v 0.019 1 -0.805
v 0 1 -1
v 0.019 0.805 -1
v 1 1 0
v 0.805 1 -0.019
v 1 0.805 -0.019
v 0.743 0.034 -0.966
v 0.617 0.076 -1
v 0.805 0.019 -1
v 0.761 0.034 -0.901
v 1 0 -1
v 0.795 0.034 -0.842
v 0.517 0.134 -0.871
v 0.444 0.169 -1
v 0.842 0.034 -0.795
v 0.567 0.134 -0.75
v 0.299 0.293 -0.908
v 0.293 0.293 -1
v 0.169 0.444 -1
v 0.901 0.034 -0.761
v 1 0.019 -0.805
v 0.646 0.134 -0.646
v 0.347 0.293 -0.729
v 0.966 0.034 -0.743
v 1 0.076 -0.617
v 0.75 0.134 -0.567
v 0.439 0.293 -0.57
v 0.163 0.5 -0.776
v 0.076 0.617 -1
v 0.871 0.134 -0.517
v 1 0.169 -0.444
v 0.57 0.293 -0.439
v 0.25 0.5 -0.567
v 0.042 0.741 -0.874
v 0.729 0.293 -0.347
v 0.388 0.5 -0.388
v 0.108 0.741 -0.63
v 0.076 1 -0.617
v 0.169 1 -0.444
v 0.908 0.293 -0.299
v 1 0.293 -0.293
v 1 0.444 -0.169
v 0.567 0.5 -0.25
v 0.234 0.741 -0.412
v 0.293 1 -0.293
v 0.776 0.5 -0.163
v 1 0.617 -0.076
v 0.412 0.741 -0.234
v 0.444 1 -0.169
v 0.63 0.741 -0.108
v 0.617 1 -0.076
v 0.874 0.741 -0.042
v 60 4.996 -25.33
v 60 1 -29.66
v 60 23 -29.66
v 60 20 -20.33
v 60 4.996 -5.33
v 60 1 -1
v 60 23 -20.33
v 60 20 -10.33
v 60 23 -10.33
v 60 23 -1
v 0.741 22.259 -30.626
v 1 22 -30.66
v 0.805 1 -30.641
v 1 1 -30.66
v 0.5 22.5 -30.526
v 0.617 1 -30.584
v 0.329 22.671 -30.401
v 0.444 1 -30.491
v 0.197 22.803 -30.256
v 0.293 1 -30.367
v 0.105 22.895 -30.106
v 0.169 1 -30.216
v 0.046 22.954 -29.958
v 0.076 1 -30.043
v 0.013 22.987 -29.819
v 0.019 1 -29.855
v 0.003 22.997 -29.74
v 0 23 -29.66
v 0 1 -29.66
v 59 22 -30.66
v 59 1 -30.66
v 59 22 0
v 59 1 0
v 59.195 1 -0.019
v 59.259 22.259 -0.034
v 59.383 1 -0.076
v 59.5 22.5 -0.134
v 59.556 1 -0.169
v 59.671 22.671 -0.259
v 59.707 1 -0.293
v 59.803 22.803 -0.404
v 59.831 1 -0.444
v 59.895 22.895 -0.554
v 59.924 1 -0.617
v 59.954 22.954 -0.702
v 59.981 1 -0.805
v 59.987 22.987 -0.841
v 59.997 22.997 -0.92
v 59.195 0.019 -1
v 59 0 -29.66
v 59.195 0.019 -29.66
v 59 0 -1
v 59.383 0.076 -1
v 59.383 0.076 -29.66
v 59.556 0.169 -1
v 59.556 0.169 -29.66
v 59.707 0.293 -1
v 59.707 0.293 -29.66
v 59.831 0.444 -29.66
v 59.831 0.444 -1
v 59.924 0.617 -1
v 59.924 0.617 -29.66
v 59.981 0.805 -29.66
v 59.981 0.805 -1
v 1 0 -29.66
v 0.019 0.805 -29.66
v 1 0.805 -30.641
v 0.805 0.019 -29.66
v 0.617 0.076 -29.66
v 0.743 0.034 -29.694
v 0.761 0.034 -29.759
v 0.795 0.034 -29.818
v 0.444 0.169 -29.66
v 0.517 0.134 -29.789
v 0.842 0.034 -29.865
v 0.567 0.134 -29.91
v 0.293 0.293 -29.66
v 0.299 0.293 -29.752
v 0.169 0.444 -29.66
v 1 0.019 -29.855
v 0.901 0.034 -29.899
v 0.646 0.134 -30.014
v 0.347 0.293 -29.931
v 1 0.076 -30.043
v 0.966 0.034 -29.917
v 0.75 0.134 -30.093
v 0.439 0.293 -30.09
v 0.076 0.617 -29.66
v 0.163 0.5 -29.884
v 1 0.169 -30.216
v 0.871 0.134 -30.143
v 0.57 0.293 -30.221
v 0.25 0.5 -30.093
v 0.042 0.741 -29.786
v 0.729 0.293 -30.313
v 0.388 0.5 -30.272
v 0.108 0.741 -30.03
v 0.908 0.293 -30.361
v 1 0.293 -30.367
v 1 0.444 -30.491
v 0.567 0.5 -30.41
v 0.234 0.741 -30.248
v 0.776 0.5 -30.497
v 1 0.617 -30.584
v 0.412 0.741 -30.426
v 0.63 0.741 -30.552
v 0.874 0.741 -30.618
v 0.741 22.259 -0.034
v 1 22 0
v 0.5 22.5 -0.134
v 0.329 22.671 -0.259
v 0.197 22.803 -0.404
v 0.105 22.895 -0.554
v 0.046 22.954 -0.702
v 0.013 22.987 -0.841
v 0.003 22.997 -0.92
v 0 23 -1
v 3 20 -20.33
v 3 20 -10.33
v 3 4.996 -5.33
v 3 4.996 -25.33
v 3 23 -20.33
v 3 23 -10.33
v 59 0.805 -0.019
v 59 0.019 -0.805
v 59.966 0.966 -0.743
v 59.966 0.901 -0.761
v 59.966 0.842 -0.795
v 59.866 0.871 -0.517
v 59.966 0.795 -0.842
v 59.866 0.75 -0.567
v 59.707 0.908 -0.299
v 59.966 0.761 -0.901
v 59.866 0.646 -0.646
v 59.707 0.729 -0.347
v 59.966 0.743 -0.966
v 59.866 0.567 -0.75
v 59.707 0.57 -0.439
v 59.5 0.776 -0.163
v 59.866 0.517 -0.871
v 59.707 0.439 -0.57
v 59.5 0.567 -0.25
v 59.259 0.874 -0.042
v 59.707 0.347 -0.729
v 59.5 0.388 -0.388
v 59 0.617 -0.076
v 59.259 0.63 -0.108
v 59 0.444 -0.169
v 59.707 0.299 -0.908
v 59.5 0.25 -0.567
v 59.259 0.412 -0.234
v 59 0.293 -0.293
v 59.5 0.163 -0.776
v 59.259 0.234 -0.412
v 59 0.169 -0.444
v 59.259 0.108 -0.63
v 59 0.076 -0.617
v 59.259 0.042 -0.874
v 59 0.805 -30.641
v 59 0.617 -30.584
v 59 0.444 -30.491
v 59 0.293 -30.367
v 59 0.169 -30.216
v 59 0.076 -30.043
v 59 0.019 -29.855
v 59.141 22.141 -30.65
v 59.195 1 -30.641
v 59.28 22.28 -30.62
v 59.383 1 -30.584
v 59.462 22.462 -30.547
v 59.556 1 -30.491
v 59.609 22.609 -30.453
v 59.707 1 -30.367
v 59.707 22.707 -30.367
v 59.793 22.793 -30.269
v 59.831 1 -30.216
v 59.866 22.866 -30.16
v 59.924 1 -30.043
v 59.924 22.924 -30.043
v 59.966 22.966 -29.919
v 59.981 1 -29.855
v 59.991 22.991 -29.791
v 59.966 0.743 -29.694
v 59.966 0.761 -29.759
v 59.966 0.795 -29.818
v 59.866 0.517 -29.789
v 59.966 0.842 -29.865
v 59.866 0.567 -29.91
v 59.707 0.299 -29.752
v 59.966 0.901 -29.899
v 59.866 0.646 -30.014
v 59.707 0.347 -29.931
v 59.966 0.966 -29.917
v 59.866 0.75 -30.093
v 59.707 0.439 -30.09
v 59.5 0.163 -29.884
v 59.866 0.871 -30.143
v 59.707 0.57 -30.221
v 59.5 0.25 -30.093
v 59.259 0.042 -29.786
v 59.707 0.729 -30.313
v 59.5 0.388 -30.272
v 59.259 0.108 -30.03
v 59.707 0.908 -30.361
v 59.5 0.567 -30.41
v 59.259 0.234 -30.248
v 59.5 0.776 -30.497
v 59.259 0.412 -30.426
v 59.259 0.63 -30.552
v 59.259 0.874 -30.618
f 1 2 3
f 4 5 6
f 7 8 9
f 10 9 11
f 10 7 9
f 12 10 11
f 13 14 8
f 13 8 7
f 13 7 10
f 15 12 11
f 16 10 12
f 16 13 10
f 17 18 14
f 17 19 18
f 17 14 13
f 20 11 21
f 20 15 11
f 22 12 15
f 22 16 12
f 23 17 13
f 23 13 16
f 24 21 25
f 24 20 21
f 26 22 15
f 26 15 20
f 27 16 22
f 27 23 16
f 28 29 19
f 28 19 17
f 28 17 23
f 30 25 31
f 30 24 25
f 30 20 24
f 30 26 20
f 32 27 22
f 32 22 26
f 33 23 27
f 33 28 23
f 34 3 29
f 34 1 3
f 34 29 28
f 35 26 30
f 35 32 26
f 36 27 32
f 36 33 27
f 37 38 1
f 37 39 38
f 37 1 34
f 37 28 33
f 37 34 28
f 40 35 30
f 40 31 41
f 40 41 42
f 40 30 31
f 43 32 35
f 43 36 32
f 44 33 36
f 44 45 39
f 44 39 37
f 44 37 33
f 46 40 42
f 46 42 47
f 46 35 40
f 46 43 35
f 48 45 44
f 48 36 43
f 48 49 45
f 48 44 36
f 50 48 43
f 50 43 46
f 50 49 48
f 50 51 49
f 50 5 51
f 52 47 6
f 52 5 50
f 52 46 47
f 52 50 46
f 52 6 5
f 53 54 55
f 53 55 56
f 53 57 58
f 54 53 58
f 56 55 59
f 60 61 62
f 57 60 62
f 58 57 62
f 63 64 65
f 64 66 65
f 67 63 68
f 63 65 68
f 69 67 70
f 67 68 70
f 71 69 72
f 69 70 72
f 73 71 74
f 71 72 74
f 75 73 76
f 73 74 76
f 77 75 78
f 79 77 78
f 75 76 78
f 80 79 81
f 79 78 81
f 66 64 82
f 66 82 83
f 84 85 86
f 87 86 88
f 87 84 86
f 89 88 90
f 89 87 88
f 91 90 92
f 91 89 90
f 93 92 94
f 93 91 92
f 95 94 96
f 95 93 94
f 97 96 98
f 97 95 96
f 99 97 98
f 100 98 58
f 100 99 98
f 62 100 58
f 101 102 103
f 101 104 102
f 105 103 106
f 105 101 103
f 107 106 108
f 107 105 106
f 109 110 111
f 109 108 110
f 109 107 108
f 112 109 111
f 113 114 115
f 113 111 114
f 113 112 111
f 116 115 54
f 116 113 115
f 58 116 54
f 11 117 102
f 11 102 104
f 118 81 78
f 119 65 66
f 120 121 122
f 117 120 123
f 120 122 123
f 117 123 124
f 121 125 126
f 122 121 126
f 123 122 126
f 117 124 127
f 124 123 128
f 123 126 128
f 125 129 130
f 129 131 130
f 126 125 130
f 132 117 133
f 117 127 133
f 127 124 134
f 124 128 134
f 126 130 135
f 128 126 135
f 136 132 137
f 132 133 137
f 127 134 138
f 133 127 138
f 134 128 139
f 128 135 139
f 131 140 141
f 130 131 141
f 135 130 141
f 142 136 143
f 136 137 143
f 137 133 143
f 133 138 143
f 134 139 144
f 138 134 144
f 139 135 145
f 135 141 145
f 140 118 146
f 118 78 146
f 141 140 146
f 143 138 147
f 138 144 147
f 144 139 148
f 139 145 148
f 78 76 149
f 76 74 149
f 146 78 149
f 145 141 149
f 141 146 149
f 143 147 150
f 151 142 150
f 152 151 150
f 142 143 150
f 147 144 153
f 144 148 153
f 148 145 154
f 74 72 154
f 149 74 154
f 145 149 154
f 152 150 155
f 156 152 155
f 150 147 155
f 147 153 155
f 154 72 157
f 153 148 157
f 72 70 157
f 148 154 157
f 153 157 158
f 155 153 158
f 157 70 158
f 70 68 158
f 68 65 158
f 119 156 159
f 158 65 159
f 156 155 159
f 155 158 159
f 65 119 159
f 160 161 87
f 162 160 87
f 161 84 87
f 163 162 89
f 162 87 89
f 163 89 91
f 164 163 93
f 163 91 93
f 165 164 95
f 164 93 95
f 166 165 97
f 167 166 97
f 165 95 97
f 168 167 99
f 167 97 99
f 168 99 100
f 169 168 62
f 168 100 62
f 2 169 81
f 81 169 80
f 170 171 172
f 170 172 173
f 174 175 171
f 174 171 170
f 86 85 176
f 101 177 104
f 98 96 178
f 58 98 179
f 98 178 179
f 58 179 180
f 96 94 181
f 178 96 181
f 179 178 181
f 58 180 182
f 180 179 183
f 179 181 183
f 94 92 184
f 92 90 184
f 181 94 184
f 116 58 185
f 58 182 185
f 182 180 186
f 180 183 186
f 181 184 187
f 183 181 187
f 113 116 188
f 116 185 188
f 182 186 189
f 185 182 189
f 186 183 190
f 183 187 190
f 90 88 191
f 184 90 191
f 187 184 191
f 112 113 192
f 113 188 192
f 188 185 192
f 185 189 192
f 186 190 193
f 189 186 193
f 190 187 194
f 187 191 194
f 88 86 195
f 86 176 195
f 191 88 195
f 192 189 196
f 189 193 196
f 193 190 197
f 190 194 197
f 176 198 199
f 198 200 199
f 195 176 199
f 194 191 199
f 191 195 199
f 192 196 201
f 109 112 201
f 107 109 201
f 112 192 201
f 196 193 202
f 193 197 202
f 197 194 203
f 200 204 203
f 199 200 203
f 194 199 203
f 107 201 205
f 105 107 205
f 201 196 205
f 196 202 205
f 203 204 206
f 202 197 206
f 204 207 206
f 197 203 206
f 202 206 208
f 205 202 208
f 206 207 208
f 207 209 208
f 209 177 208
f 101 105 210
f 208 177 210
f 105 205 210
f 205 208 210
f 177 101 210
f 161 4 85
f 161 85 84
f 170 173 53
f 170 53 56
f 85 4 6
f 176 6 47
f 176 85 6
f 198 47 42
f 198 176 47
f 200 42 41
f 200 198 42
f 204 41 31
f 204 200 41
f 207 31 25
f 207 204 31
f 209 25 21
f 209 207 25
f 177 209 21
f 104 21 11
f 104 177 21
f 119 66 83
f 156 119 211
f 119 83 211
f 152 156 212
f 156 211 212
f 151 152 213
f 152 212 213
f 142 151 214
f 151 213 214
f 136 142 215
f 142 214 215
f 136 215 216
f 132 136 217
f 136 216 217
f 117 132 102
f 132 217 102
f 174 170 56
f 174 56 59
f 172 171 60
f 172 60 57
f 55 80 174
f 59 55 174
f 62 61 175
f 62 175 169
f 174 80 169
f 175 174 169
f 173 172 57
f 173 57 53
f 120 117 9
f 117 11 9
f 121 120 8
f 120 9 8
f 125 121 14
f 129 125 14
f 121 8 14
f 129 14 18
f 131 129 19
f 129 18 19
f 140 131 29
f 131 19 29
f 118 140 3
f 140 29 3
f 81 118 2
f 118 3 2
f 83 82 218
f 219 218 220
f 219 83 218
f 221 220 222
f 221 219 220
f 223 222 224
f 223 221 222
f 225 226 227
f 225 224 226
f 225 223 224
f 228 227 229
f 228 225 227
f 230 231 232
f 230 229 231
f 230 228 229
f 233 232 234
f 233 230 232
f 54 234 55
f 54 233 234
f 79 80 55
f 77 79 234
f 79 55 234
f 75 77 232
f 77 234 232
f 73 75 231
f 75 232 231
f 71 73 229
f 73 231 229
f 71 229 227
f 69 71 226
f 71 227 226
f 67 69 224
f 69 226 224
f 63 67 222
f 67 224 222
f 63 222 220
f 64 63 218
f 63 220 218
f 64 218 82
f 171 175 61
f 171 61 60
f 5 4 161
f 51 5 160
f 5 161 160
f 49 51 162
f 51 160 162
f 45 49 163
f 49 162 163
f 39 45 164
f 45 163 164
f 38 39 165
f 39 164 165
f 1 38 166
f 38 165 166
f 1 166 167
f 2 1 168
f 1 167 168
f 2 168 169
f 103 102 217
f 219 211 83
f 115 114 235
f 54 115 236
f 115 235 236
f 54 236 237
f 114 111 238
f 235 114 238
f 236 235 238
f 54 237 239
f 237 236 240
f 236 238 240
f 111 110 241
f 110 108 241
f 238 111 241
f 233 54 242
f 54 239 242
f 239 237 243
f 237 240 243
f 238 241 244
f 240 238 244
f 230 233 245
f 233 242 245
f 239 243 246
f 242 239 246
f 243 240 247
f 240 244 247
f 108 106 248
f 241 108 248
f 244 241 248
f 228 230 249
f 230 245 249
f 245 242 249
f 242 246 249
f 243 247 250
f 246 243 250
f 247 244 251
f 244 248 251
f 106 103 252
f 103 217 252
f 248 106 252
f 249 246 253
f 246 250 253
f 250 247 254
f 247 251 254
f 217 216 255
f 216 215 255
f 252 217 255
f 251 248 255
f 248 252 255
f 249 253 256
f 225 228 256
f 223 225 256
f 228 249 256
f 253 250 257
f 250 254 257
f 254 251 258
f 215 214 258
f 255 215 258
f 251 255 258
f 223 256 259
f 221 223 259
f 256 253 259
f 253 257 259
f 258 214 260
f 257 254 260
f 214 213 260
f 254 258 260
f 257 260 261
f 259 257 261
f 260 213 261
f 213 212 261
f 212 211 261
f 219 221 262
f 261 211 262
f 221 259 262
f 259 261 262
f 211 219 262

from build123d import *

# Parameters (mm, degrees)
BOSS_EXTRUDE1_DEPTH = 60
FILLET1_R           = 1
BOSS_EXTRUDE2_DEPTH = 3


with BuildPart() as part:
    # Sketch2 → Boss-Extrude1 (new body)
    with BuildSketch(Plane(origin=(0, 0, 0), x_dir=(0, 0, -1), z_dir=(1, 0, 0))):
        Polygon((0, 0), (0, 23), (10.33, 23), (10.33, 20), (5.33, 4.995680218), (25.33, 4.995680218), (20.33, 20), (20.33, 23), (30.66, 23), (30.66, 0), align=None)
    extrude(amount=BOSS_EXTRUDE1_DEPTH)

    # Fillet1
    fillet1_edges = [part.edges().sort_by_distance(p)[0] for p in [
        (0, 11.5, 0),
        (0, 11.5, -30.66),
        (0, 0, -15.33),
        (30, 0, 0),
        (30, 23, 0),
        (30, 23, -30.66),
        (30, 0, -30.66),
        (60, 11.5, 0),
        (60, 0, -15.33),
        (60, 11.5, -30.66),
    ]]
    fillet(fillet1_edges, radius=FILLET1_R)

    # Sketch3 → Boss-Extrude2 (add)
    with BuildSketch(Plane.ZY):
        Polygon((-20.33, 23), (-10.33, 23), (-10.33, 20), (-5.33, 4.995680218), (-25.33, 4.995680218), (-20.33, 20), align=None)
    extrude(amount=-BOSS_EXTRUDE2_DEPTH)


solid = part.part
